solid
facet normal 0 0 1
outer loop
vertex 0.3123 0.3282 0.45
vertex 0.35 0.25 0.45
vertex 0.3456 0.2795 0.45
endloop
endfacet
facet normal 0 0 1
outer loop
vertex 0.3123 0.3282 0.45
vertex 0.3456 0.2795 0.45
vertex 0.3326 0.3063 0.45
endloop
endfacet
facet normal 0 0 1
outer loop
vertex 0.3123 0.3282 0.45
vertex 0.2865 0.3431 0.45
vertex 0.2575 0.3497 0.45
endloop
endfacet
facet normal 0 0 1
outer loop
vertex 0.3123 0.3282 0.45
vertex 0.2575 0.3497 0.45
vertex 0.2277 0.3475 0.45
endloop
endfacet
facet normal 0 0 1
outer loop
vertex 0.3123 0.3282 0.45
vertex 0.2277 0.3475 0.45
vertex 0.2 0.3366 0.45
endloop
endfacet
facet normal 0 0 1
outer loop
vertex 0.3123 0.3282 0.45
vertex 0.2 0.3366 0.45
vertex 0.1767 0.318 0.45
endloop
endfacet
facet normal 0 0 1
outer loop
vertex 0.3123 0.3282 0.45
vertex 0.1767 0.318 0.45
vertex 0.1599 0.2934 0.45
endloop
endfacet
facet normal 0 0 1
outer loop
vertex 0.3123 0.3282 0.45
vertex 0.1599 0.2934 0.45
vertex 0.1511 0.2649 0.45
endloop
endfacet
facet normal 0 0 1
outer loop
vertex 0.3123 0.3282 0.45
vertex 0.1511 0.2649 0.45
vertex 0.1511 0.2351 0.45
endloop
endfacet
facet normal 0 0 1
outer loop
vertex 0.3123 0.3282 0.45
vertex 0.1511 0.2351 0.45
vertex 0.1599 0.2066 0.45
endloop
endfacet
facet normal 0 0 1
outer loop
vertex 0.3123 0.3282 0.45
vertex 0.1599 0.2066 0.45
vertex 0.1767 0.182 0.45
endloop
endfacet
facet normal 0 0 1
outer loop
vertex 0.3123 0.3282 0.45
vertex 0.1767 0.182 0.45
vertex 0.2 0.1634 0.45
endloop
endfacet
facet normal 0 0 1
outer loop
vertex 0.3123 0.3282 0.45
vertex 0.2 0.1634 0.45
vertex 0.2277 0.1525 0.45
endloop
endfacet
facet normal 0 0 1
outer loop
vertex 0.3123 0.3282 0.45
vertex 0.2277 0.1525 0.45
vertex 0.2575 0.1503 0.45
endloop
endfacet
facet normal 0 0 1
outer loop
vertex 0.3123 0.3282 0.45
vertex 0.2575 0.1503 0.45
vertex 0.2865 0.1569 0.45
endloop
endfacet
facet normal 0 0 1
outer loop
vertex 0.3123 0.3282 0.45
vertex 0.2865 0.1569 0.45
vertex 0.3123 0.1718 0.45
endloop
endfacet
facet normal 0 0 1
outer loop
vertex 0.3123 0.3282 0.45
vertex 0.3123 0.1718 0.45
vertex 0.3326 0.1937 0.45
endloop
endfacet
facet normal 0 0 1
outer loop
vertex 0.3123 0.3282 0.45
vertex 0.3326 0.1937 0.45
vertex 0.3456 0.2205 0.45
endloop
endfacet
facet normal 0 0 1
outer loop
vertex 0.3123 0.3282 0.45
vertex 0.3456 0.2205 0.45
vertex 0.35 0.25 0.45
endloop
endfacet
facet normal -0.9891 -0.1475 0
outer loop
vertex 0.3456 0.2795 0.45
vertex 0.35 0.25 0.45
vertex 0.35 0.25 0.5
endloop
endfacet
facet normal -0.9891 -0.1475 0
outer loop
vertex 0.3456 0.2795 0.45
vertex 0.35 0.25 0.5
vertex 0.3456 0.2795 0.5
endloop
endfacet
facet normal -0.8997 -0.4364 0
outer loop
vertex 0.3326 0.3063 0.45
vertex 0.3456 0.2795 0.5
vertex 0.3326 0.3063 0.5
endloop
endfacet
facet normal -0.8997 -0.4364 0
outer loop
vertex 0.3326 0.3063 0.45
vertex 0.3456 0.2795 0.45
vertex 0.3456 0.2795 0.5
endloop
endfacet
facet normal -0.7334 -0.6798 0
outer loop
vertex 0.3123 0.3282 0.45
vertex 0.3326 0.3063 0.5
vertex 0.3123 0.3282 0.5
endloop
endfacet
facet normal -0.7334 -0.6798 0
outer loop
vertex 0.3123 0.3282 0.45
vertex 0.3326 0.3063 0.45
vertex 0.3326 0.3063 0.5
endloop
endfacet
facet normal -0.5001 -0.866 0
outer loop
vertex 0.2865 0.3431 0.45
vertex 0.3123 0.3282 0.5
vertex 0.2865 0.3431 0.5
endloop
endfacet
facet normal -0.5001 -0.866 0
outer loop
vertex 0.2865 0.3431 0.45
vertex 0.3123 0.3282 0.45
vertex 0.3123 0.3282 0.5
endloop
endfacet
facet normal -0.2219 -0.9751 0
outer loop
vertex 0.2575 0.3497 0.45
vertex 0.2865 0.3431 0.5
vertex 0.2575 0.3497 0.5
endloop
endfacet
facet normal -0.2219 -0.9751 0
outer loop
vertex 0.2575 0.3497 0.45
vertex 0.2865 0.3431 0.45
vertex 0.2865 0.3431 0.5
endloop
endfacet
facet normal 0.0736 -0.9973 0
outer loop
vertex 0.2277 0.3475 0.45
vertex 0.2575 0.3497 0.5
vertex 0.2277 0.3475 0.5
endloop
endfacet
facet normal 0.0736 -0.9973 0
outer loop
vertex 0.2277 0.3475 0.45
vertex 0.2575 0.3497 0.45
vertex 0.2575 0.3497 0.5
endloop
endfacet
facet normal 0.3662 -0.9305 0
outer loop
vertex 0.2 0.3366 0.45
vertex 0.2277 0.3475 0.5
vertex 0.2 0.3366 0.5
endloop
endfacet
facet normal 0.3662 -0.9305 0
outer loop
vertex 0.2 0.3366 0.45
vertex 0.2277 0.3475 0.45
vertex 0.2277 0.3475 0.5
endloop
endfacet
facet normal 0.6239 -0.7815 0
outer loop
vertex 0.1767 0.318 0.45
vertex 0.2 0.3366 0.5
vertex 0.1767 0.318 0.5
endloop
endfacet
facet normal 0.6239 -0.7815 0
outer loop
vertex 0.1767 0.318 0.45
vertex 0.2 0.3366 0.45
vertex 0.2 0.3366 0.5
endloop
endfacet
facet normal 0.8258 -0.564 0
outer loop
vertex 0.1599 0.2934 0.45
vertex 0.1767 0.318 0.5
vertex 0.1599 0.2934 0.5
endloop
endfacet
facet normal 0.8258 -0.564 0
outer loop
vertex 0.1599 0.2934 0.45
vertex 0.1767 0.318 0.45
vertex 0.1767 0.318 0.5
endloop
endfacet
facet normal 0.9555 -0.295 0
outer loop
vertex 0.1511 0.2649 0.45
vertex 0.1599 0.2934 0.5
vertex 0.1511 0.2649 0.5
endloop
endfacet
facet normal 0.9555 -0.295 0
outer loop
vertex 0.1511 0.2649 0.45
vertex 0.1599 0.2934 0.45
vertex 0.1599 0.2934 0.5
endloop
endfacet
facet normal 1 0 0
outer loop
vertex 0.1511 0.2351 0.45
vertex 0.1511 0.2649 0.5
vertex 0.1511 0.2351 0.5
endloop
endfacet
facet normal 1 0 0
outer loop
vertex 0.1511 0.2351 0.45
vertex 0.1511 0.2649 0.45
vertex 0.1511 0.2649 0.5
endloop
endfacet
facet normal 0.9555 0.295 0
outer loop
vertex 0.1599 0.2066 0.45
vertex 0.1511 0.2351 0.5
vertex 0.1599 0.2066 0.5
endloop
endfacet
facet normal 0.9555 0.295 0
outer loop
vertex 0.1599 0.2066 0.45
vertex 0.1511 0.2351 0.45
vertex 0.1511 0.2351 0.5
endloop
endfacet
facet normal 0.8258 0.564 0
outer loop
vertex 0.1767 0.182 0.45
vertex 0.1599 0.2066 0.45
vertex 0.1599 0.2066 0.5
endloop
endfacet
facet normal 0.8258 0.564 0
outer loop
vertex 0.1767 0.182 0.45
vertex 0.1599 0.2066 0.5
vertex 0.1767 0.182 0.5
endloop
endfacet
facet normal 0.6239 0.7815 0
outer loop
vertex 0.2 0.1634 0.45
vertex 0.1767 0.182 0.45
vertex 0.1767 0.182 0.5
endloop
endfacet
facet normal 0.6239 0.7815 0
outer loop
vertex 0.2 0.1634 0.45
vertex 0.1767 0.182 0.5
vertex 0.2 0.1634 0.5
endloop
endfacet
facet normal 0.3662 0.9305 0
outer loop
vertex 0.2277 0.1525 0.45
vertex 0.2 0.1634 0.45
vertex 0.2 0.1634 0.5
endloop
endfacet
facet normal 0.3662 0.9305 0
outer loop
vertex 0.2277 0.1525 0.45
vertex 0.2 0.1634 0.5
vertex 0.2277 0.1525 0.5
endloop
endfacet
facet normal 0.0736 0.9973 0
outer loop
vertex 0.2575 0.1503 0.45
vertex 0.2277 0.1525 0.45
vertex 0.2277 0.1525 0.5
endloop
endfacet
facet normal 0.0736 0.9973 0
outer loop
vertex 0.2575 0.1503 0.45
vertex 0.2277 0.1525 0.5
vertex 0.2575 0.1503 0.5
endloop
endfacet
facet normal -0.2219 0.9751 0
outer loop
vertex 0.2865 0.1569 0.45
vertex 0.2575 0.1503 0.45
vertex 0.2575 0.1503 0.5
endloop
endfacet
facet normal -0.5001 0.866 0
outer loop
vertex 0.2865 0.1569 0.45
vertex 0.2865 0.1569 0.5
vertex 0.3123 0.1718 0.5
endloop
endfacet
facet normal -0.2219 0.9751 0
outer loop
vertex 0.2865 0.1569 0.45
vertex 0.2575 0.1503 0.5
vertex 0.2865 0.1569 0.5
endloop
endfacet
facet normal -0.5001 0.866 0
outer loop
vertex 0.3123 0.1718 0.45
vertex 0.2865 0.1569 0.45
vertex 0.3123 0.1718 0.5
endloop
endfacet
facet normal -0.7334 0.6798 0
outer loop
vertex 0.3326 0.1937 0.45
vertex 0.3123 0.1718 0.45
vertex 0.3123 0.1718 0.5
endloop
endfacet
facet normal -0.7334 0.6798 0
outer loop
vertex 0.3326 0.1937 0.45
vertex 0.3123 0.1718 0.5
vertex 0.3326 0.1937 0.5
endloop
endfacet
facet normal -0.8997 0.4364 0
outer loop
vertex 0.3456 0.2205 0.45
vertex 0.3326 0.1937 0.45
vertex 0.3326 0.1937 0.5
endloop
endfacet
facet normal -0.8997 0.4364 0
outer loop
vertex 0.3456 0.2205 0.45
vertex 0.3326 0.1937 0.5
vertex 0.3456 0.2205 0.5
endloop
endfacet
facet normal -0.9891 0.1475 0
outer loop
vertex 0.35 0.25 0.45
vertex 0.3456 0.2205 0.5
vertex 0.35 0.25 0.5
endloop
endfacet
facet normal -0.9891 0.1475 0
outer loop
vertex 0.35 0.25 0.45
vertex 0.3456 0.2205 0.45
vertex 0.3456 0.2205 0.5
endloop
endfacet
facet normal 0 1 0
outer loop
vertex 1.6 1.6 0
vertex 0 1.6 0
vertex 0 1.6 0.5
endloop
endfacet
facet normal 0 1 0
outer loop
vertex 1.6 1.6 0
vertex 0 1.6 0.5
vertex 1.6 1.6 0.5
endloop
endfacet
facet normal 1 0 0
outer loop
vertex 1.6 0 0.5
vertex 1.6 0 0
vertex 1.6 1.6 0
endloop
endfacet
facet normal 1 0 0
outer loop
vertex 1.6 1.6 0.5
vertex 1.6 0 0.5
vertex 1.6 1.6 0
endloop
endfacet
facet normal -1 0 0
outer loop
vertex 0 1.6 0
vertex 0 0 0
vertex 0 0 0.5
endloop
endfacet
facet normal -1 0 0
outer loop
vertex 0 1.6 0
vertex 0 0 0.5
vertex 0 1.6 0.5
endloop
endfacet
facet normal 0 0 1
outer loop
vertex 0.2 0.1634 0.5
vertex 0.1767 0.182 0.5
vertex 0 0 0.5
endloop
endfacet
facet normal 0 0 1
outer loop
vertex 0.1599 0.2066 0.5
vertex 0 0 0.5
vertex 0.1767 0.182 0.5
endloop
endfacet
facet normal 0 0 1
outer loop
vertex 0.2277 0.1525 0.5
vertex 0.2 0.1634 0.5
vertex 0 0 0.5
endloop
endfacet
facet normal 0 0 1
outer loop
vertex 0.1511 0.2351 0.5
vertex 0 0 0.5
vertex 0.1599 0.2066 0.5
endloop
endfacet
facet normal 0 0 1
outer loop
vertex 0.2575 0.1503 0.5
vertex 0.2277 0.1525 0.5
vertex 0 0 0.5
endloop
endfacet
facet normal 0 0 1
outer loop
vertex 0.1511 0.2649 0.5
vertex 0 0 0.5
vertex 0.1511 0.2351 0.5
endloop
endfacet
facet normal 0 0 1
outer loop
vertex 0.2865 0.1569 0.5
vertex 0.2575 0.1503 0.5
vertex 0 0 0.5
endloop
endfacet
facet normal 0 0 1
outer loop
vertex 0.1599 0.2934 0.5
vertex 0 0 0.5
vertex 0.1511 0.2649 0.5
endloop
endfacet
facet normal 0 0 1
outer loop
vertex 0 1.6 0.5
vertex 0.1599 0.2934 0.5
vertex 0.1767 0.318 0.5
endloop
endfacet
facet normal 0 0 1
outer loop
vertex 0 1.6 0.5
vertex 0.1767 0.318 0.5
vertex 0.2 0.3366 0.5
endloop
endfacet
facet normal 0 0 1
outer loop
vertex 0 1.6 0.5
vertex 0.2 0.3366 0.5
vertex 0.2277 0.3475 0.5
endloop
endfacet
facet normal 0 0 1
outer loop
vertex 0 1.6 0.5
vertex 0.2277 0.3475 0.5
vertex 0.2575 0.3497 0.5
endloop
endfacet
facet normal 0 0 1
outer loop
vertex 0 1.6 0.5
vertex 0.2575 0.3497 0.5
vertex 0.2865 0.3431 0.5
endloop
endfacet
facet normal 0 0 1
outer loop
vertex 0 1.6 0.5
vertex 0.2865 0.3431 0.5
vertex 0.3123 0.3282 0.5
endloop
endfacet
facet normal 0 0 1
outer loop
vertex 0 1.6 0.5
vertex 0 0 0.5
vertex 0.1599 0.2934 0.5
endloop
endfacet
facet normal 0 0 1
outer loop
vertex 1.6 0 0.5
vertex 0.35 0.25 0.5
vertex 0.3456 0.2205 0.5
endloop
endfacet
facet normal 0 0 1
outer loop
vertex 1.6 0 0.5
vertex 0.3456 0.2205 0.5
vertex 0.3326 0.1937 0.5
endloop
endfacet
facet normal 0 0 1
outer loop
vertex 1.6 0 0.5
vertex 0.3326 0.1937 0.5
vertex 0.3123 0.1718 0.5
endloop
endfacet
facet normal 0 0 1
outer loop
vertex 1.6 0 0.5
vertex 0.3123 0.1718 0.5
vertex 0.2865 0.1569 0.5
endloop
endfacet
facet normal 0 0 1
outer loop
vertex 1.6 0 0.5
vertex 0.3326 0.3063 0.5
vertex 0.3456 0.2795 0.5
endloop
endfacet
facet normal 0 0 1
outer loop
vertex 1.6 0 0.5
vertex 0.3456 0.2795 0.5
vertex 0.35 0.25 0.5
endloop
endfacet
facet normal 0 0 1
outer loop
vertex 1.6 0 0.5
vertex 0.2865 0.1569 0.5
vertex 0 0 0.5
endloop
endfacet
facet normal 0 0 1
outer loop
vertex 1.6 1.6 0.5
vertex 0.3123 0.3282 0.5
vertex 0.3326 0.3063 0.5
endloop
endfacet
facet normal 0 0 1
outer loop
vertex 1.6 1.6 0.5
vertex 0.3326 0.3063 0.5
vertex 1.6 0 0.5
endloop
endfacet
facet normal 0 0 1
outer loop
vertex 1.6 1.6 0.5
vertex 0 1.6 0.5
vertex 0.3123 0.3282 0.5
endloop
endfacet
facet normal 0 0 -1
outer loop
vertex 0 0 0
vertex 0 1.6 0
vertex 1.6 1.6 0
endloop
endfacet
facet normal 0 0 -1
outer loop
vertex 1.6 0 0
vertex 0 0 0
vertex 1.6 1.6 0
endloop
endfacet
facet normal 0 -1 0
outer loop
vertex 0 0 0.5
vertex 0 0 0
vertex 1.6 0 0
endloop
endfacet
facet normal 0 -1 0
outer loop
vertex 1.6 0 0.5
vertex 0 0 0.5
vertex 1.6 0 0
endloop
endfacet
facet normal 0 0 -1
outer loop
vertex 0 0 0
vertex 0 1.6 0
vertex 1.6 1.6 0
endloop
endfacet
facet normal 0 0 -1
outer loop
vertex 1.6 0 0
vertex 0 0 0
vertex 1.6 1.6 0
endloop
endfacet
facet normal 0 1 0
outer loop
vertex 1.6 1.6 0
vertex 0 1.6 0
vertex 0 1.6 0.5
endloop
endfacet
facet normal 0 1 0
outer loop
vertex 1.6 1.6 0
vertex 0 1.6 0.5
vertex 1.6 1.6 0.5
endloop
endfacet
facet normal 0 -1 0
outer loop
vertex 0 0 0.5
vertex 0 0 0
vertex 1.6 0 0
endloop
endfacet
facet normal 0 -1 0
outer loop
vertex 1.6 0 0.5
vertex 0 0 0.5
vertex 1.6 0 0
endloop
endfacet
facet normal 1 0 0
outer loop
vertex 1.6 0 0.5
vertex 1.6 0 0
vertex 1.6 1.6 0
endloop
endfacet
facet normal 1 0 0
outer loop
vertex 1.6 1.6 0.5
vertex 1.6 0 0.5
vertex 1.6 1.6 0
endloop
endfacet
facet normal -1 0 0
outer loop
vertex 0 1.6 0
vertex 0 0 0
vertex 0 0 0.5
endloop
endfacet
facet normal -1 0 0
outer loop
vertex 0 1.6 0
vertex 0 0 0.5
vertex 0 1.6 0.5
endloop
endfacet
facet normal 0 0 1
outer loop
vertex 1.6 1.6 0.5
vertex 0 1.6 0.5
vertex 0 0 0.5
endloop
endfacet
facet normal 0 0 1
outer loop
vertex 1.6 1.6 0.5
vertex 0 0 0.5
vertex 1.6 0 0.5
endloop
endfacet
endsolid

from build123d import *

# Parameters (mm, degrees)
BOX_W          = 1.6
BOX_H          = 1.6
BOX_DEPTH      = 0.5
CYLINDER_R     = 0.1
CYLINDER_DEPTH = 0.5


with BuildPart() as cube:
    # Box → Box (new body)
    with BuildSketch(Plane.XY):
        with Locations((0.8, 0.8)):
            Rectangle(BOX_W, BOX_H)
    extrude(amount=BOX_DEPTH)


with BuildPart() as body:
    # Body base: copy of Cube
    add(cube.part)


with BuildPart() as cylinder:
    # Cylinder → Cylinder (new body)
    with BuildSketch(Plane(origin=(0.25, 0.25, 0.45), x_dir=(1, 0, 0), z_dir=(0, 0, 1))):
        Circle(CYLINDER_R)
    extrude(amount=CYLINDER_DEPTH)


with BuildPart() as cut:
    # Cut base: copy of Cube
    add(cube.part)

    # Cut: cut Cylinder
    add(cylinder.part, mode=Mode.SUBTRACT)


solid = Compound([body.part, cut.part])
